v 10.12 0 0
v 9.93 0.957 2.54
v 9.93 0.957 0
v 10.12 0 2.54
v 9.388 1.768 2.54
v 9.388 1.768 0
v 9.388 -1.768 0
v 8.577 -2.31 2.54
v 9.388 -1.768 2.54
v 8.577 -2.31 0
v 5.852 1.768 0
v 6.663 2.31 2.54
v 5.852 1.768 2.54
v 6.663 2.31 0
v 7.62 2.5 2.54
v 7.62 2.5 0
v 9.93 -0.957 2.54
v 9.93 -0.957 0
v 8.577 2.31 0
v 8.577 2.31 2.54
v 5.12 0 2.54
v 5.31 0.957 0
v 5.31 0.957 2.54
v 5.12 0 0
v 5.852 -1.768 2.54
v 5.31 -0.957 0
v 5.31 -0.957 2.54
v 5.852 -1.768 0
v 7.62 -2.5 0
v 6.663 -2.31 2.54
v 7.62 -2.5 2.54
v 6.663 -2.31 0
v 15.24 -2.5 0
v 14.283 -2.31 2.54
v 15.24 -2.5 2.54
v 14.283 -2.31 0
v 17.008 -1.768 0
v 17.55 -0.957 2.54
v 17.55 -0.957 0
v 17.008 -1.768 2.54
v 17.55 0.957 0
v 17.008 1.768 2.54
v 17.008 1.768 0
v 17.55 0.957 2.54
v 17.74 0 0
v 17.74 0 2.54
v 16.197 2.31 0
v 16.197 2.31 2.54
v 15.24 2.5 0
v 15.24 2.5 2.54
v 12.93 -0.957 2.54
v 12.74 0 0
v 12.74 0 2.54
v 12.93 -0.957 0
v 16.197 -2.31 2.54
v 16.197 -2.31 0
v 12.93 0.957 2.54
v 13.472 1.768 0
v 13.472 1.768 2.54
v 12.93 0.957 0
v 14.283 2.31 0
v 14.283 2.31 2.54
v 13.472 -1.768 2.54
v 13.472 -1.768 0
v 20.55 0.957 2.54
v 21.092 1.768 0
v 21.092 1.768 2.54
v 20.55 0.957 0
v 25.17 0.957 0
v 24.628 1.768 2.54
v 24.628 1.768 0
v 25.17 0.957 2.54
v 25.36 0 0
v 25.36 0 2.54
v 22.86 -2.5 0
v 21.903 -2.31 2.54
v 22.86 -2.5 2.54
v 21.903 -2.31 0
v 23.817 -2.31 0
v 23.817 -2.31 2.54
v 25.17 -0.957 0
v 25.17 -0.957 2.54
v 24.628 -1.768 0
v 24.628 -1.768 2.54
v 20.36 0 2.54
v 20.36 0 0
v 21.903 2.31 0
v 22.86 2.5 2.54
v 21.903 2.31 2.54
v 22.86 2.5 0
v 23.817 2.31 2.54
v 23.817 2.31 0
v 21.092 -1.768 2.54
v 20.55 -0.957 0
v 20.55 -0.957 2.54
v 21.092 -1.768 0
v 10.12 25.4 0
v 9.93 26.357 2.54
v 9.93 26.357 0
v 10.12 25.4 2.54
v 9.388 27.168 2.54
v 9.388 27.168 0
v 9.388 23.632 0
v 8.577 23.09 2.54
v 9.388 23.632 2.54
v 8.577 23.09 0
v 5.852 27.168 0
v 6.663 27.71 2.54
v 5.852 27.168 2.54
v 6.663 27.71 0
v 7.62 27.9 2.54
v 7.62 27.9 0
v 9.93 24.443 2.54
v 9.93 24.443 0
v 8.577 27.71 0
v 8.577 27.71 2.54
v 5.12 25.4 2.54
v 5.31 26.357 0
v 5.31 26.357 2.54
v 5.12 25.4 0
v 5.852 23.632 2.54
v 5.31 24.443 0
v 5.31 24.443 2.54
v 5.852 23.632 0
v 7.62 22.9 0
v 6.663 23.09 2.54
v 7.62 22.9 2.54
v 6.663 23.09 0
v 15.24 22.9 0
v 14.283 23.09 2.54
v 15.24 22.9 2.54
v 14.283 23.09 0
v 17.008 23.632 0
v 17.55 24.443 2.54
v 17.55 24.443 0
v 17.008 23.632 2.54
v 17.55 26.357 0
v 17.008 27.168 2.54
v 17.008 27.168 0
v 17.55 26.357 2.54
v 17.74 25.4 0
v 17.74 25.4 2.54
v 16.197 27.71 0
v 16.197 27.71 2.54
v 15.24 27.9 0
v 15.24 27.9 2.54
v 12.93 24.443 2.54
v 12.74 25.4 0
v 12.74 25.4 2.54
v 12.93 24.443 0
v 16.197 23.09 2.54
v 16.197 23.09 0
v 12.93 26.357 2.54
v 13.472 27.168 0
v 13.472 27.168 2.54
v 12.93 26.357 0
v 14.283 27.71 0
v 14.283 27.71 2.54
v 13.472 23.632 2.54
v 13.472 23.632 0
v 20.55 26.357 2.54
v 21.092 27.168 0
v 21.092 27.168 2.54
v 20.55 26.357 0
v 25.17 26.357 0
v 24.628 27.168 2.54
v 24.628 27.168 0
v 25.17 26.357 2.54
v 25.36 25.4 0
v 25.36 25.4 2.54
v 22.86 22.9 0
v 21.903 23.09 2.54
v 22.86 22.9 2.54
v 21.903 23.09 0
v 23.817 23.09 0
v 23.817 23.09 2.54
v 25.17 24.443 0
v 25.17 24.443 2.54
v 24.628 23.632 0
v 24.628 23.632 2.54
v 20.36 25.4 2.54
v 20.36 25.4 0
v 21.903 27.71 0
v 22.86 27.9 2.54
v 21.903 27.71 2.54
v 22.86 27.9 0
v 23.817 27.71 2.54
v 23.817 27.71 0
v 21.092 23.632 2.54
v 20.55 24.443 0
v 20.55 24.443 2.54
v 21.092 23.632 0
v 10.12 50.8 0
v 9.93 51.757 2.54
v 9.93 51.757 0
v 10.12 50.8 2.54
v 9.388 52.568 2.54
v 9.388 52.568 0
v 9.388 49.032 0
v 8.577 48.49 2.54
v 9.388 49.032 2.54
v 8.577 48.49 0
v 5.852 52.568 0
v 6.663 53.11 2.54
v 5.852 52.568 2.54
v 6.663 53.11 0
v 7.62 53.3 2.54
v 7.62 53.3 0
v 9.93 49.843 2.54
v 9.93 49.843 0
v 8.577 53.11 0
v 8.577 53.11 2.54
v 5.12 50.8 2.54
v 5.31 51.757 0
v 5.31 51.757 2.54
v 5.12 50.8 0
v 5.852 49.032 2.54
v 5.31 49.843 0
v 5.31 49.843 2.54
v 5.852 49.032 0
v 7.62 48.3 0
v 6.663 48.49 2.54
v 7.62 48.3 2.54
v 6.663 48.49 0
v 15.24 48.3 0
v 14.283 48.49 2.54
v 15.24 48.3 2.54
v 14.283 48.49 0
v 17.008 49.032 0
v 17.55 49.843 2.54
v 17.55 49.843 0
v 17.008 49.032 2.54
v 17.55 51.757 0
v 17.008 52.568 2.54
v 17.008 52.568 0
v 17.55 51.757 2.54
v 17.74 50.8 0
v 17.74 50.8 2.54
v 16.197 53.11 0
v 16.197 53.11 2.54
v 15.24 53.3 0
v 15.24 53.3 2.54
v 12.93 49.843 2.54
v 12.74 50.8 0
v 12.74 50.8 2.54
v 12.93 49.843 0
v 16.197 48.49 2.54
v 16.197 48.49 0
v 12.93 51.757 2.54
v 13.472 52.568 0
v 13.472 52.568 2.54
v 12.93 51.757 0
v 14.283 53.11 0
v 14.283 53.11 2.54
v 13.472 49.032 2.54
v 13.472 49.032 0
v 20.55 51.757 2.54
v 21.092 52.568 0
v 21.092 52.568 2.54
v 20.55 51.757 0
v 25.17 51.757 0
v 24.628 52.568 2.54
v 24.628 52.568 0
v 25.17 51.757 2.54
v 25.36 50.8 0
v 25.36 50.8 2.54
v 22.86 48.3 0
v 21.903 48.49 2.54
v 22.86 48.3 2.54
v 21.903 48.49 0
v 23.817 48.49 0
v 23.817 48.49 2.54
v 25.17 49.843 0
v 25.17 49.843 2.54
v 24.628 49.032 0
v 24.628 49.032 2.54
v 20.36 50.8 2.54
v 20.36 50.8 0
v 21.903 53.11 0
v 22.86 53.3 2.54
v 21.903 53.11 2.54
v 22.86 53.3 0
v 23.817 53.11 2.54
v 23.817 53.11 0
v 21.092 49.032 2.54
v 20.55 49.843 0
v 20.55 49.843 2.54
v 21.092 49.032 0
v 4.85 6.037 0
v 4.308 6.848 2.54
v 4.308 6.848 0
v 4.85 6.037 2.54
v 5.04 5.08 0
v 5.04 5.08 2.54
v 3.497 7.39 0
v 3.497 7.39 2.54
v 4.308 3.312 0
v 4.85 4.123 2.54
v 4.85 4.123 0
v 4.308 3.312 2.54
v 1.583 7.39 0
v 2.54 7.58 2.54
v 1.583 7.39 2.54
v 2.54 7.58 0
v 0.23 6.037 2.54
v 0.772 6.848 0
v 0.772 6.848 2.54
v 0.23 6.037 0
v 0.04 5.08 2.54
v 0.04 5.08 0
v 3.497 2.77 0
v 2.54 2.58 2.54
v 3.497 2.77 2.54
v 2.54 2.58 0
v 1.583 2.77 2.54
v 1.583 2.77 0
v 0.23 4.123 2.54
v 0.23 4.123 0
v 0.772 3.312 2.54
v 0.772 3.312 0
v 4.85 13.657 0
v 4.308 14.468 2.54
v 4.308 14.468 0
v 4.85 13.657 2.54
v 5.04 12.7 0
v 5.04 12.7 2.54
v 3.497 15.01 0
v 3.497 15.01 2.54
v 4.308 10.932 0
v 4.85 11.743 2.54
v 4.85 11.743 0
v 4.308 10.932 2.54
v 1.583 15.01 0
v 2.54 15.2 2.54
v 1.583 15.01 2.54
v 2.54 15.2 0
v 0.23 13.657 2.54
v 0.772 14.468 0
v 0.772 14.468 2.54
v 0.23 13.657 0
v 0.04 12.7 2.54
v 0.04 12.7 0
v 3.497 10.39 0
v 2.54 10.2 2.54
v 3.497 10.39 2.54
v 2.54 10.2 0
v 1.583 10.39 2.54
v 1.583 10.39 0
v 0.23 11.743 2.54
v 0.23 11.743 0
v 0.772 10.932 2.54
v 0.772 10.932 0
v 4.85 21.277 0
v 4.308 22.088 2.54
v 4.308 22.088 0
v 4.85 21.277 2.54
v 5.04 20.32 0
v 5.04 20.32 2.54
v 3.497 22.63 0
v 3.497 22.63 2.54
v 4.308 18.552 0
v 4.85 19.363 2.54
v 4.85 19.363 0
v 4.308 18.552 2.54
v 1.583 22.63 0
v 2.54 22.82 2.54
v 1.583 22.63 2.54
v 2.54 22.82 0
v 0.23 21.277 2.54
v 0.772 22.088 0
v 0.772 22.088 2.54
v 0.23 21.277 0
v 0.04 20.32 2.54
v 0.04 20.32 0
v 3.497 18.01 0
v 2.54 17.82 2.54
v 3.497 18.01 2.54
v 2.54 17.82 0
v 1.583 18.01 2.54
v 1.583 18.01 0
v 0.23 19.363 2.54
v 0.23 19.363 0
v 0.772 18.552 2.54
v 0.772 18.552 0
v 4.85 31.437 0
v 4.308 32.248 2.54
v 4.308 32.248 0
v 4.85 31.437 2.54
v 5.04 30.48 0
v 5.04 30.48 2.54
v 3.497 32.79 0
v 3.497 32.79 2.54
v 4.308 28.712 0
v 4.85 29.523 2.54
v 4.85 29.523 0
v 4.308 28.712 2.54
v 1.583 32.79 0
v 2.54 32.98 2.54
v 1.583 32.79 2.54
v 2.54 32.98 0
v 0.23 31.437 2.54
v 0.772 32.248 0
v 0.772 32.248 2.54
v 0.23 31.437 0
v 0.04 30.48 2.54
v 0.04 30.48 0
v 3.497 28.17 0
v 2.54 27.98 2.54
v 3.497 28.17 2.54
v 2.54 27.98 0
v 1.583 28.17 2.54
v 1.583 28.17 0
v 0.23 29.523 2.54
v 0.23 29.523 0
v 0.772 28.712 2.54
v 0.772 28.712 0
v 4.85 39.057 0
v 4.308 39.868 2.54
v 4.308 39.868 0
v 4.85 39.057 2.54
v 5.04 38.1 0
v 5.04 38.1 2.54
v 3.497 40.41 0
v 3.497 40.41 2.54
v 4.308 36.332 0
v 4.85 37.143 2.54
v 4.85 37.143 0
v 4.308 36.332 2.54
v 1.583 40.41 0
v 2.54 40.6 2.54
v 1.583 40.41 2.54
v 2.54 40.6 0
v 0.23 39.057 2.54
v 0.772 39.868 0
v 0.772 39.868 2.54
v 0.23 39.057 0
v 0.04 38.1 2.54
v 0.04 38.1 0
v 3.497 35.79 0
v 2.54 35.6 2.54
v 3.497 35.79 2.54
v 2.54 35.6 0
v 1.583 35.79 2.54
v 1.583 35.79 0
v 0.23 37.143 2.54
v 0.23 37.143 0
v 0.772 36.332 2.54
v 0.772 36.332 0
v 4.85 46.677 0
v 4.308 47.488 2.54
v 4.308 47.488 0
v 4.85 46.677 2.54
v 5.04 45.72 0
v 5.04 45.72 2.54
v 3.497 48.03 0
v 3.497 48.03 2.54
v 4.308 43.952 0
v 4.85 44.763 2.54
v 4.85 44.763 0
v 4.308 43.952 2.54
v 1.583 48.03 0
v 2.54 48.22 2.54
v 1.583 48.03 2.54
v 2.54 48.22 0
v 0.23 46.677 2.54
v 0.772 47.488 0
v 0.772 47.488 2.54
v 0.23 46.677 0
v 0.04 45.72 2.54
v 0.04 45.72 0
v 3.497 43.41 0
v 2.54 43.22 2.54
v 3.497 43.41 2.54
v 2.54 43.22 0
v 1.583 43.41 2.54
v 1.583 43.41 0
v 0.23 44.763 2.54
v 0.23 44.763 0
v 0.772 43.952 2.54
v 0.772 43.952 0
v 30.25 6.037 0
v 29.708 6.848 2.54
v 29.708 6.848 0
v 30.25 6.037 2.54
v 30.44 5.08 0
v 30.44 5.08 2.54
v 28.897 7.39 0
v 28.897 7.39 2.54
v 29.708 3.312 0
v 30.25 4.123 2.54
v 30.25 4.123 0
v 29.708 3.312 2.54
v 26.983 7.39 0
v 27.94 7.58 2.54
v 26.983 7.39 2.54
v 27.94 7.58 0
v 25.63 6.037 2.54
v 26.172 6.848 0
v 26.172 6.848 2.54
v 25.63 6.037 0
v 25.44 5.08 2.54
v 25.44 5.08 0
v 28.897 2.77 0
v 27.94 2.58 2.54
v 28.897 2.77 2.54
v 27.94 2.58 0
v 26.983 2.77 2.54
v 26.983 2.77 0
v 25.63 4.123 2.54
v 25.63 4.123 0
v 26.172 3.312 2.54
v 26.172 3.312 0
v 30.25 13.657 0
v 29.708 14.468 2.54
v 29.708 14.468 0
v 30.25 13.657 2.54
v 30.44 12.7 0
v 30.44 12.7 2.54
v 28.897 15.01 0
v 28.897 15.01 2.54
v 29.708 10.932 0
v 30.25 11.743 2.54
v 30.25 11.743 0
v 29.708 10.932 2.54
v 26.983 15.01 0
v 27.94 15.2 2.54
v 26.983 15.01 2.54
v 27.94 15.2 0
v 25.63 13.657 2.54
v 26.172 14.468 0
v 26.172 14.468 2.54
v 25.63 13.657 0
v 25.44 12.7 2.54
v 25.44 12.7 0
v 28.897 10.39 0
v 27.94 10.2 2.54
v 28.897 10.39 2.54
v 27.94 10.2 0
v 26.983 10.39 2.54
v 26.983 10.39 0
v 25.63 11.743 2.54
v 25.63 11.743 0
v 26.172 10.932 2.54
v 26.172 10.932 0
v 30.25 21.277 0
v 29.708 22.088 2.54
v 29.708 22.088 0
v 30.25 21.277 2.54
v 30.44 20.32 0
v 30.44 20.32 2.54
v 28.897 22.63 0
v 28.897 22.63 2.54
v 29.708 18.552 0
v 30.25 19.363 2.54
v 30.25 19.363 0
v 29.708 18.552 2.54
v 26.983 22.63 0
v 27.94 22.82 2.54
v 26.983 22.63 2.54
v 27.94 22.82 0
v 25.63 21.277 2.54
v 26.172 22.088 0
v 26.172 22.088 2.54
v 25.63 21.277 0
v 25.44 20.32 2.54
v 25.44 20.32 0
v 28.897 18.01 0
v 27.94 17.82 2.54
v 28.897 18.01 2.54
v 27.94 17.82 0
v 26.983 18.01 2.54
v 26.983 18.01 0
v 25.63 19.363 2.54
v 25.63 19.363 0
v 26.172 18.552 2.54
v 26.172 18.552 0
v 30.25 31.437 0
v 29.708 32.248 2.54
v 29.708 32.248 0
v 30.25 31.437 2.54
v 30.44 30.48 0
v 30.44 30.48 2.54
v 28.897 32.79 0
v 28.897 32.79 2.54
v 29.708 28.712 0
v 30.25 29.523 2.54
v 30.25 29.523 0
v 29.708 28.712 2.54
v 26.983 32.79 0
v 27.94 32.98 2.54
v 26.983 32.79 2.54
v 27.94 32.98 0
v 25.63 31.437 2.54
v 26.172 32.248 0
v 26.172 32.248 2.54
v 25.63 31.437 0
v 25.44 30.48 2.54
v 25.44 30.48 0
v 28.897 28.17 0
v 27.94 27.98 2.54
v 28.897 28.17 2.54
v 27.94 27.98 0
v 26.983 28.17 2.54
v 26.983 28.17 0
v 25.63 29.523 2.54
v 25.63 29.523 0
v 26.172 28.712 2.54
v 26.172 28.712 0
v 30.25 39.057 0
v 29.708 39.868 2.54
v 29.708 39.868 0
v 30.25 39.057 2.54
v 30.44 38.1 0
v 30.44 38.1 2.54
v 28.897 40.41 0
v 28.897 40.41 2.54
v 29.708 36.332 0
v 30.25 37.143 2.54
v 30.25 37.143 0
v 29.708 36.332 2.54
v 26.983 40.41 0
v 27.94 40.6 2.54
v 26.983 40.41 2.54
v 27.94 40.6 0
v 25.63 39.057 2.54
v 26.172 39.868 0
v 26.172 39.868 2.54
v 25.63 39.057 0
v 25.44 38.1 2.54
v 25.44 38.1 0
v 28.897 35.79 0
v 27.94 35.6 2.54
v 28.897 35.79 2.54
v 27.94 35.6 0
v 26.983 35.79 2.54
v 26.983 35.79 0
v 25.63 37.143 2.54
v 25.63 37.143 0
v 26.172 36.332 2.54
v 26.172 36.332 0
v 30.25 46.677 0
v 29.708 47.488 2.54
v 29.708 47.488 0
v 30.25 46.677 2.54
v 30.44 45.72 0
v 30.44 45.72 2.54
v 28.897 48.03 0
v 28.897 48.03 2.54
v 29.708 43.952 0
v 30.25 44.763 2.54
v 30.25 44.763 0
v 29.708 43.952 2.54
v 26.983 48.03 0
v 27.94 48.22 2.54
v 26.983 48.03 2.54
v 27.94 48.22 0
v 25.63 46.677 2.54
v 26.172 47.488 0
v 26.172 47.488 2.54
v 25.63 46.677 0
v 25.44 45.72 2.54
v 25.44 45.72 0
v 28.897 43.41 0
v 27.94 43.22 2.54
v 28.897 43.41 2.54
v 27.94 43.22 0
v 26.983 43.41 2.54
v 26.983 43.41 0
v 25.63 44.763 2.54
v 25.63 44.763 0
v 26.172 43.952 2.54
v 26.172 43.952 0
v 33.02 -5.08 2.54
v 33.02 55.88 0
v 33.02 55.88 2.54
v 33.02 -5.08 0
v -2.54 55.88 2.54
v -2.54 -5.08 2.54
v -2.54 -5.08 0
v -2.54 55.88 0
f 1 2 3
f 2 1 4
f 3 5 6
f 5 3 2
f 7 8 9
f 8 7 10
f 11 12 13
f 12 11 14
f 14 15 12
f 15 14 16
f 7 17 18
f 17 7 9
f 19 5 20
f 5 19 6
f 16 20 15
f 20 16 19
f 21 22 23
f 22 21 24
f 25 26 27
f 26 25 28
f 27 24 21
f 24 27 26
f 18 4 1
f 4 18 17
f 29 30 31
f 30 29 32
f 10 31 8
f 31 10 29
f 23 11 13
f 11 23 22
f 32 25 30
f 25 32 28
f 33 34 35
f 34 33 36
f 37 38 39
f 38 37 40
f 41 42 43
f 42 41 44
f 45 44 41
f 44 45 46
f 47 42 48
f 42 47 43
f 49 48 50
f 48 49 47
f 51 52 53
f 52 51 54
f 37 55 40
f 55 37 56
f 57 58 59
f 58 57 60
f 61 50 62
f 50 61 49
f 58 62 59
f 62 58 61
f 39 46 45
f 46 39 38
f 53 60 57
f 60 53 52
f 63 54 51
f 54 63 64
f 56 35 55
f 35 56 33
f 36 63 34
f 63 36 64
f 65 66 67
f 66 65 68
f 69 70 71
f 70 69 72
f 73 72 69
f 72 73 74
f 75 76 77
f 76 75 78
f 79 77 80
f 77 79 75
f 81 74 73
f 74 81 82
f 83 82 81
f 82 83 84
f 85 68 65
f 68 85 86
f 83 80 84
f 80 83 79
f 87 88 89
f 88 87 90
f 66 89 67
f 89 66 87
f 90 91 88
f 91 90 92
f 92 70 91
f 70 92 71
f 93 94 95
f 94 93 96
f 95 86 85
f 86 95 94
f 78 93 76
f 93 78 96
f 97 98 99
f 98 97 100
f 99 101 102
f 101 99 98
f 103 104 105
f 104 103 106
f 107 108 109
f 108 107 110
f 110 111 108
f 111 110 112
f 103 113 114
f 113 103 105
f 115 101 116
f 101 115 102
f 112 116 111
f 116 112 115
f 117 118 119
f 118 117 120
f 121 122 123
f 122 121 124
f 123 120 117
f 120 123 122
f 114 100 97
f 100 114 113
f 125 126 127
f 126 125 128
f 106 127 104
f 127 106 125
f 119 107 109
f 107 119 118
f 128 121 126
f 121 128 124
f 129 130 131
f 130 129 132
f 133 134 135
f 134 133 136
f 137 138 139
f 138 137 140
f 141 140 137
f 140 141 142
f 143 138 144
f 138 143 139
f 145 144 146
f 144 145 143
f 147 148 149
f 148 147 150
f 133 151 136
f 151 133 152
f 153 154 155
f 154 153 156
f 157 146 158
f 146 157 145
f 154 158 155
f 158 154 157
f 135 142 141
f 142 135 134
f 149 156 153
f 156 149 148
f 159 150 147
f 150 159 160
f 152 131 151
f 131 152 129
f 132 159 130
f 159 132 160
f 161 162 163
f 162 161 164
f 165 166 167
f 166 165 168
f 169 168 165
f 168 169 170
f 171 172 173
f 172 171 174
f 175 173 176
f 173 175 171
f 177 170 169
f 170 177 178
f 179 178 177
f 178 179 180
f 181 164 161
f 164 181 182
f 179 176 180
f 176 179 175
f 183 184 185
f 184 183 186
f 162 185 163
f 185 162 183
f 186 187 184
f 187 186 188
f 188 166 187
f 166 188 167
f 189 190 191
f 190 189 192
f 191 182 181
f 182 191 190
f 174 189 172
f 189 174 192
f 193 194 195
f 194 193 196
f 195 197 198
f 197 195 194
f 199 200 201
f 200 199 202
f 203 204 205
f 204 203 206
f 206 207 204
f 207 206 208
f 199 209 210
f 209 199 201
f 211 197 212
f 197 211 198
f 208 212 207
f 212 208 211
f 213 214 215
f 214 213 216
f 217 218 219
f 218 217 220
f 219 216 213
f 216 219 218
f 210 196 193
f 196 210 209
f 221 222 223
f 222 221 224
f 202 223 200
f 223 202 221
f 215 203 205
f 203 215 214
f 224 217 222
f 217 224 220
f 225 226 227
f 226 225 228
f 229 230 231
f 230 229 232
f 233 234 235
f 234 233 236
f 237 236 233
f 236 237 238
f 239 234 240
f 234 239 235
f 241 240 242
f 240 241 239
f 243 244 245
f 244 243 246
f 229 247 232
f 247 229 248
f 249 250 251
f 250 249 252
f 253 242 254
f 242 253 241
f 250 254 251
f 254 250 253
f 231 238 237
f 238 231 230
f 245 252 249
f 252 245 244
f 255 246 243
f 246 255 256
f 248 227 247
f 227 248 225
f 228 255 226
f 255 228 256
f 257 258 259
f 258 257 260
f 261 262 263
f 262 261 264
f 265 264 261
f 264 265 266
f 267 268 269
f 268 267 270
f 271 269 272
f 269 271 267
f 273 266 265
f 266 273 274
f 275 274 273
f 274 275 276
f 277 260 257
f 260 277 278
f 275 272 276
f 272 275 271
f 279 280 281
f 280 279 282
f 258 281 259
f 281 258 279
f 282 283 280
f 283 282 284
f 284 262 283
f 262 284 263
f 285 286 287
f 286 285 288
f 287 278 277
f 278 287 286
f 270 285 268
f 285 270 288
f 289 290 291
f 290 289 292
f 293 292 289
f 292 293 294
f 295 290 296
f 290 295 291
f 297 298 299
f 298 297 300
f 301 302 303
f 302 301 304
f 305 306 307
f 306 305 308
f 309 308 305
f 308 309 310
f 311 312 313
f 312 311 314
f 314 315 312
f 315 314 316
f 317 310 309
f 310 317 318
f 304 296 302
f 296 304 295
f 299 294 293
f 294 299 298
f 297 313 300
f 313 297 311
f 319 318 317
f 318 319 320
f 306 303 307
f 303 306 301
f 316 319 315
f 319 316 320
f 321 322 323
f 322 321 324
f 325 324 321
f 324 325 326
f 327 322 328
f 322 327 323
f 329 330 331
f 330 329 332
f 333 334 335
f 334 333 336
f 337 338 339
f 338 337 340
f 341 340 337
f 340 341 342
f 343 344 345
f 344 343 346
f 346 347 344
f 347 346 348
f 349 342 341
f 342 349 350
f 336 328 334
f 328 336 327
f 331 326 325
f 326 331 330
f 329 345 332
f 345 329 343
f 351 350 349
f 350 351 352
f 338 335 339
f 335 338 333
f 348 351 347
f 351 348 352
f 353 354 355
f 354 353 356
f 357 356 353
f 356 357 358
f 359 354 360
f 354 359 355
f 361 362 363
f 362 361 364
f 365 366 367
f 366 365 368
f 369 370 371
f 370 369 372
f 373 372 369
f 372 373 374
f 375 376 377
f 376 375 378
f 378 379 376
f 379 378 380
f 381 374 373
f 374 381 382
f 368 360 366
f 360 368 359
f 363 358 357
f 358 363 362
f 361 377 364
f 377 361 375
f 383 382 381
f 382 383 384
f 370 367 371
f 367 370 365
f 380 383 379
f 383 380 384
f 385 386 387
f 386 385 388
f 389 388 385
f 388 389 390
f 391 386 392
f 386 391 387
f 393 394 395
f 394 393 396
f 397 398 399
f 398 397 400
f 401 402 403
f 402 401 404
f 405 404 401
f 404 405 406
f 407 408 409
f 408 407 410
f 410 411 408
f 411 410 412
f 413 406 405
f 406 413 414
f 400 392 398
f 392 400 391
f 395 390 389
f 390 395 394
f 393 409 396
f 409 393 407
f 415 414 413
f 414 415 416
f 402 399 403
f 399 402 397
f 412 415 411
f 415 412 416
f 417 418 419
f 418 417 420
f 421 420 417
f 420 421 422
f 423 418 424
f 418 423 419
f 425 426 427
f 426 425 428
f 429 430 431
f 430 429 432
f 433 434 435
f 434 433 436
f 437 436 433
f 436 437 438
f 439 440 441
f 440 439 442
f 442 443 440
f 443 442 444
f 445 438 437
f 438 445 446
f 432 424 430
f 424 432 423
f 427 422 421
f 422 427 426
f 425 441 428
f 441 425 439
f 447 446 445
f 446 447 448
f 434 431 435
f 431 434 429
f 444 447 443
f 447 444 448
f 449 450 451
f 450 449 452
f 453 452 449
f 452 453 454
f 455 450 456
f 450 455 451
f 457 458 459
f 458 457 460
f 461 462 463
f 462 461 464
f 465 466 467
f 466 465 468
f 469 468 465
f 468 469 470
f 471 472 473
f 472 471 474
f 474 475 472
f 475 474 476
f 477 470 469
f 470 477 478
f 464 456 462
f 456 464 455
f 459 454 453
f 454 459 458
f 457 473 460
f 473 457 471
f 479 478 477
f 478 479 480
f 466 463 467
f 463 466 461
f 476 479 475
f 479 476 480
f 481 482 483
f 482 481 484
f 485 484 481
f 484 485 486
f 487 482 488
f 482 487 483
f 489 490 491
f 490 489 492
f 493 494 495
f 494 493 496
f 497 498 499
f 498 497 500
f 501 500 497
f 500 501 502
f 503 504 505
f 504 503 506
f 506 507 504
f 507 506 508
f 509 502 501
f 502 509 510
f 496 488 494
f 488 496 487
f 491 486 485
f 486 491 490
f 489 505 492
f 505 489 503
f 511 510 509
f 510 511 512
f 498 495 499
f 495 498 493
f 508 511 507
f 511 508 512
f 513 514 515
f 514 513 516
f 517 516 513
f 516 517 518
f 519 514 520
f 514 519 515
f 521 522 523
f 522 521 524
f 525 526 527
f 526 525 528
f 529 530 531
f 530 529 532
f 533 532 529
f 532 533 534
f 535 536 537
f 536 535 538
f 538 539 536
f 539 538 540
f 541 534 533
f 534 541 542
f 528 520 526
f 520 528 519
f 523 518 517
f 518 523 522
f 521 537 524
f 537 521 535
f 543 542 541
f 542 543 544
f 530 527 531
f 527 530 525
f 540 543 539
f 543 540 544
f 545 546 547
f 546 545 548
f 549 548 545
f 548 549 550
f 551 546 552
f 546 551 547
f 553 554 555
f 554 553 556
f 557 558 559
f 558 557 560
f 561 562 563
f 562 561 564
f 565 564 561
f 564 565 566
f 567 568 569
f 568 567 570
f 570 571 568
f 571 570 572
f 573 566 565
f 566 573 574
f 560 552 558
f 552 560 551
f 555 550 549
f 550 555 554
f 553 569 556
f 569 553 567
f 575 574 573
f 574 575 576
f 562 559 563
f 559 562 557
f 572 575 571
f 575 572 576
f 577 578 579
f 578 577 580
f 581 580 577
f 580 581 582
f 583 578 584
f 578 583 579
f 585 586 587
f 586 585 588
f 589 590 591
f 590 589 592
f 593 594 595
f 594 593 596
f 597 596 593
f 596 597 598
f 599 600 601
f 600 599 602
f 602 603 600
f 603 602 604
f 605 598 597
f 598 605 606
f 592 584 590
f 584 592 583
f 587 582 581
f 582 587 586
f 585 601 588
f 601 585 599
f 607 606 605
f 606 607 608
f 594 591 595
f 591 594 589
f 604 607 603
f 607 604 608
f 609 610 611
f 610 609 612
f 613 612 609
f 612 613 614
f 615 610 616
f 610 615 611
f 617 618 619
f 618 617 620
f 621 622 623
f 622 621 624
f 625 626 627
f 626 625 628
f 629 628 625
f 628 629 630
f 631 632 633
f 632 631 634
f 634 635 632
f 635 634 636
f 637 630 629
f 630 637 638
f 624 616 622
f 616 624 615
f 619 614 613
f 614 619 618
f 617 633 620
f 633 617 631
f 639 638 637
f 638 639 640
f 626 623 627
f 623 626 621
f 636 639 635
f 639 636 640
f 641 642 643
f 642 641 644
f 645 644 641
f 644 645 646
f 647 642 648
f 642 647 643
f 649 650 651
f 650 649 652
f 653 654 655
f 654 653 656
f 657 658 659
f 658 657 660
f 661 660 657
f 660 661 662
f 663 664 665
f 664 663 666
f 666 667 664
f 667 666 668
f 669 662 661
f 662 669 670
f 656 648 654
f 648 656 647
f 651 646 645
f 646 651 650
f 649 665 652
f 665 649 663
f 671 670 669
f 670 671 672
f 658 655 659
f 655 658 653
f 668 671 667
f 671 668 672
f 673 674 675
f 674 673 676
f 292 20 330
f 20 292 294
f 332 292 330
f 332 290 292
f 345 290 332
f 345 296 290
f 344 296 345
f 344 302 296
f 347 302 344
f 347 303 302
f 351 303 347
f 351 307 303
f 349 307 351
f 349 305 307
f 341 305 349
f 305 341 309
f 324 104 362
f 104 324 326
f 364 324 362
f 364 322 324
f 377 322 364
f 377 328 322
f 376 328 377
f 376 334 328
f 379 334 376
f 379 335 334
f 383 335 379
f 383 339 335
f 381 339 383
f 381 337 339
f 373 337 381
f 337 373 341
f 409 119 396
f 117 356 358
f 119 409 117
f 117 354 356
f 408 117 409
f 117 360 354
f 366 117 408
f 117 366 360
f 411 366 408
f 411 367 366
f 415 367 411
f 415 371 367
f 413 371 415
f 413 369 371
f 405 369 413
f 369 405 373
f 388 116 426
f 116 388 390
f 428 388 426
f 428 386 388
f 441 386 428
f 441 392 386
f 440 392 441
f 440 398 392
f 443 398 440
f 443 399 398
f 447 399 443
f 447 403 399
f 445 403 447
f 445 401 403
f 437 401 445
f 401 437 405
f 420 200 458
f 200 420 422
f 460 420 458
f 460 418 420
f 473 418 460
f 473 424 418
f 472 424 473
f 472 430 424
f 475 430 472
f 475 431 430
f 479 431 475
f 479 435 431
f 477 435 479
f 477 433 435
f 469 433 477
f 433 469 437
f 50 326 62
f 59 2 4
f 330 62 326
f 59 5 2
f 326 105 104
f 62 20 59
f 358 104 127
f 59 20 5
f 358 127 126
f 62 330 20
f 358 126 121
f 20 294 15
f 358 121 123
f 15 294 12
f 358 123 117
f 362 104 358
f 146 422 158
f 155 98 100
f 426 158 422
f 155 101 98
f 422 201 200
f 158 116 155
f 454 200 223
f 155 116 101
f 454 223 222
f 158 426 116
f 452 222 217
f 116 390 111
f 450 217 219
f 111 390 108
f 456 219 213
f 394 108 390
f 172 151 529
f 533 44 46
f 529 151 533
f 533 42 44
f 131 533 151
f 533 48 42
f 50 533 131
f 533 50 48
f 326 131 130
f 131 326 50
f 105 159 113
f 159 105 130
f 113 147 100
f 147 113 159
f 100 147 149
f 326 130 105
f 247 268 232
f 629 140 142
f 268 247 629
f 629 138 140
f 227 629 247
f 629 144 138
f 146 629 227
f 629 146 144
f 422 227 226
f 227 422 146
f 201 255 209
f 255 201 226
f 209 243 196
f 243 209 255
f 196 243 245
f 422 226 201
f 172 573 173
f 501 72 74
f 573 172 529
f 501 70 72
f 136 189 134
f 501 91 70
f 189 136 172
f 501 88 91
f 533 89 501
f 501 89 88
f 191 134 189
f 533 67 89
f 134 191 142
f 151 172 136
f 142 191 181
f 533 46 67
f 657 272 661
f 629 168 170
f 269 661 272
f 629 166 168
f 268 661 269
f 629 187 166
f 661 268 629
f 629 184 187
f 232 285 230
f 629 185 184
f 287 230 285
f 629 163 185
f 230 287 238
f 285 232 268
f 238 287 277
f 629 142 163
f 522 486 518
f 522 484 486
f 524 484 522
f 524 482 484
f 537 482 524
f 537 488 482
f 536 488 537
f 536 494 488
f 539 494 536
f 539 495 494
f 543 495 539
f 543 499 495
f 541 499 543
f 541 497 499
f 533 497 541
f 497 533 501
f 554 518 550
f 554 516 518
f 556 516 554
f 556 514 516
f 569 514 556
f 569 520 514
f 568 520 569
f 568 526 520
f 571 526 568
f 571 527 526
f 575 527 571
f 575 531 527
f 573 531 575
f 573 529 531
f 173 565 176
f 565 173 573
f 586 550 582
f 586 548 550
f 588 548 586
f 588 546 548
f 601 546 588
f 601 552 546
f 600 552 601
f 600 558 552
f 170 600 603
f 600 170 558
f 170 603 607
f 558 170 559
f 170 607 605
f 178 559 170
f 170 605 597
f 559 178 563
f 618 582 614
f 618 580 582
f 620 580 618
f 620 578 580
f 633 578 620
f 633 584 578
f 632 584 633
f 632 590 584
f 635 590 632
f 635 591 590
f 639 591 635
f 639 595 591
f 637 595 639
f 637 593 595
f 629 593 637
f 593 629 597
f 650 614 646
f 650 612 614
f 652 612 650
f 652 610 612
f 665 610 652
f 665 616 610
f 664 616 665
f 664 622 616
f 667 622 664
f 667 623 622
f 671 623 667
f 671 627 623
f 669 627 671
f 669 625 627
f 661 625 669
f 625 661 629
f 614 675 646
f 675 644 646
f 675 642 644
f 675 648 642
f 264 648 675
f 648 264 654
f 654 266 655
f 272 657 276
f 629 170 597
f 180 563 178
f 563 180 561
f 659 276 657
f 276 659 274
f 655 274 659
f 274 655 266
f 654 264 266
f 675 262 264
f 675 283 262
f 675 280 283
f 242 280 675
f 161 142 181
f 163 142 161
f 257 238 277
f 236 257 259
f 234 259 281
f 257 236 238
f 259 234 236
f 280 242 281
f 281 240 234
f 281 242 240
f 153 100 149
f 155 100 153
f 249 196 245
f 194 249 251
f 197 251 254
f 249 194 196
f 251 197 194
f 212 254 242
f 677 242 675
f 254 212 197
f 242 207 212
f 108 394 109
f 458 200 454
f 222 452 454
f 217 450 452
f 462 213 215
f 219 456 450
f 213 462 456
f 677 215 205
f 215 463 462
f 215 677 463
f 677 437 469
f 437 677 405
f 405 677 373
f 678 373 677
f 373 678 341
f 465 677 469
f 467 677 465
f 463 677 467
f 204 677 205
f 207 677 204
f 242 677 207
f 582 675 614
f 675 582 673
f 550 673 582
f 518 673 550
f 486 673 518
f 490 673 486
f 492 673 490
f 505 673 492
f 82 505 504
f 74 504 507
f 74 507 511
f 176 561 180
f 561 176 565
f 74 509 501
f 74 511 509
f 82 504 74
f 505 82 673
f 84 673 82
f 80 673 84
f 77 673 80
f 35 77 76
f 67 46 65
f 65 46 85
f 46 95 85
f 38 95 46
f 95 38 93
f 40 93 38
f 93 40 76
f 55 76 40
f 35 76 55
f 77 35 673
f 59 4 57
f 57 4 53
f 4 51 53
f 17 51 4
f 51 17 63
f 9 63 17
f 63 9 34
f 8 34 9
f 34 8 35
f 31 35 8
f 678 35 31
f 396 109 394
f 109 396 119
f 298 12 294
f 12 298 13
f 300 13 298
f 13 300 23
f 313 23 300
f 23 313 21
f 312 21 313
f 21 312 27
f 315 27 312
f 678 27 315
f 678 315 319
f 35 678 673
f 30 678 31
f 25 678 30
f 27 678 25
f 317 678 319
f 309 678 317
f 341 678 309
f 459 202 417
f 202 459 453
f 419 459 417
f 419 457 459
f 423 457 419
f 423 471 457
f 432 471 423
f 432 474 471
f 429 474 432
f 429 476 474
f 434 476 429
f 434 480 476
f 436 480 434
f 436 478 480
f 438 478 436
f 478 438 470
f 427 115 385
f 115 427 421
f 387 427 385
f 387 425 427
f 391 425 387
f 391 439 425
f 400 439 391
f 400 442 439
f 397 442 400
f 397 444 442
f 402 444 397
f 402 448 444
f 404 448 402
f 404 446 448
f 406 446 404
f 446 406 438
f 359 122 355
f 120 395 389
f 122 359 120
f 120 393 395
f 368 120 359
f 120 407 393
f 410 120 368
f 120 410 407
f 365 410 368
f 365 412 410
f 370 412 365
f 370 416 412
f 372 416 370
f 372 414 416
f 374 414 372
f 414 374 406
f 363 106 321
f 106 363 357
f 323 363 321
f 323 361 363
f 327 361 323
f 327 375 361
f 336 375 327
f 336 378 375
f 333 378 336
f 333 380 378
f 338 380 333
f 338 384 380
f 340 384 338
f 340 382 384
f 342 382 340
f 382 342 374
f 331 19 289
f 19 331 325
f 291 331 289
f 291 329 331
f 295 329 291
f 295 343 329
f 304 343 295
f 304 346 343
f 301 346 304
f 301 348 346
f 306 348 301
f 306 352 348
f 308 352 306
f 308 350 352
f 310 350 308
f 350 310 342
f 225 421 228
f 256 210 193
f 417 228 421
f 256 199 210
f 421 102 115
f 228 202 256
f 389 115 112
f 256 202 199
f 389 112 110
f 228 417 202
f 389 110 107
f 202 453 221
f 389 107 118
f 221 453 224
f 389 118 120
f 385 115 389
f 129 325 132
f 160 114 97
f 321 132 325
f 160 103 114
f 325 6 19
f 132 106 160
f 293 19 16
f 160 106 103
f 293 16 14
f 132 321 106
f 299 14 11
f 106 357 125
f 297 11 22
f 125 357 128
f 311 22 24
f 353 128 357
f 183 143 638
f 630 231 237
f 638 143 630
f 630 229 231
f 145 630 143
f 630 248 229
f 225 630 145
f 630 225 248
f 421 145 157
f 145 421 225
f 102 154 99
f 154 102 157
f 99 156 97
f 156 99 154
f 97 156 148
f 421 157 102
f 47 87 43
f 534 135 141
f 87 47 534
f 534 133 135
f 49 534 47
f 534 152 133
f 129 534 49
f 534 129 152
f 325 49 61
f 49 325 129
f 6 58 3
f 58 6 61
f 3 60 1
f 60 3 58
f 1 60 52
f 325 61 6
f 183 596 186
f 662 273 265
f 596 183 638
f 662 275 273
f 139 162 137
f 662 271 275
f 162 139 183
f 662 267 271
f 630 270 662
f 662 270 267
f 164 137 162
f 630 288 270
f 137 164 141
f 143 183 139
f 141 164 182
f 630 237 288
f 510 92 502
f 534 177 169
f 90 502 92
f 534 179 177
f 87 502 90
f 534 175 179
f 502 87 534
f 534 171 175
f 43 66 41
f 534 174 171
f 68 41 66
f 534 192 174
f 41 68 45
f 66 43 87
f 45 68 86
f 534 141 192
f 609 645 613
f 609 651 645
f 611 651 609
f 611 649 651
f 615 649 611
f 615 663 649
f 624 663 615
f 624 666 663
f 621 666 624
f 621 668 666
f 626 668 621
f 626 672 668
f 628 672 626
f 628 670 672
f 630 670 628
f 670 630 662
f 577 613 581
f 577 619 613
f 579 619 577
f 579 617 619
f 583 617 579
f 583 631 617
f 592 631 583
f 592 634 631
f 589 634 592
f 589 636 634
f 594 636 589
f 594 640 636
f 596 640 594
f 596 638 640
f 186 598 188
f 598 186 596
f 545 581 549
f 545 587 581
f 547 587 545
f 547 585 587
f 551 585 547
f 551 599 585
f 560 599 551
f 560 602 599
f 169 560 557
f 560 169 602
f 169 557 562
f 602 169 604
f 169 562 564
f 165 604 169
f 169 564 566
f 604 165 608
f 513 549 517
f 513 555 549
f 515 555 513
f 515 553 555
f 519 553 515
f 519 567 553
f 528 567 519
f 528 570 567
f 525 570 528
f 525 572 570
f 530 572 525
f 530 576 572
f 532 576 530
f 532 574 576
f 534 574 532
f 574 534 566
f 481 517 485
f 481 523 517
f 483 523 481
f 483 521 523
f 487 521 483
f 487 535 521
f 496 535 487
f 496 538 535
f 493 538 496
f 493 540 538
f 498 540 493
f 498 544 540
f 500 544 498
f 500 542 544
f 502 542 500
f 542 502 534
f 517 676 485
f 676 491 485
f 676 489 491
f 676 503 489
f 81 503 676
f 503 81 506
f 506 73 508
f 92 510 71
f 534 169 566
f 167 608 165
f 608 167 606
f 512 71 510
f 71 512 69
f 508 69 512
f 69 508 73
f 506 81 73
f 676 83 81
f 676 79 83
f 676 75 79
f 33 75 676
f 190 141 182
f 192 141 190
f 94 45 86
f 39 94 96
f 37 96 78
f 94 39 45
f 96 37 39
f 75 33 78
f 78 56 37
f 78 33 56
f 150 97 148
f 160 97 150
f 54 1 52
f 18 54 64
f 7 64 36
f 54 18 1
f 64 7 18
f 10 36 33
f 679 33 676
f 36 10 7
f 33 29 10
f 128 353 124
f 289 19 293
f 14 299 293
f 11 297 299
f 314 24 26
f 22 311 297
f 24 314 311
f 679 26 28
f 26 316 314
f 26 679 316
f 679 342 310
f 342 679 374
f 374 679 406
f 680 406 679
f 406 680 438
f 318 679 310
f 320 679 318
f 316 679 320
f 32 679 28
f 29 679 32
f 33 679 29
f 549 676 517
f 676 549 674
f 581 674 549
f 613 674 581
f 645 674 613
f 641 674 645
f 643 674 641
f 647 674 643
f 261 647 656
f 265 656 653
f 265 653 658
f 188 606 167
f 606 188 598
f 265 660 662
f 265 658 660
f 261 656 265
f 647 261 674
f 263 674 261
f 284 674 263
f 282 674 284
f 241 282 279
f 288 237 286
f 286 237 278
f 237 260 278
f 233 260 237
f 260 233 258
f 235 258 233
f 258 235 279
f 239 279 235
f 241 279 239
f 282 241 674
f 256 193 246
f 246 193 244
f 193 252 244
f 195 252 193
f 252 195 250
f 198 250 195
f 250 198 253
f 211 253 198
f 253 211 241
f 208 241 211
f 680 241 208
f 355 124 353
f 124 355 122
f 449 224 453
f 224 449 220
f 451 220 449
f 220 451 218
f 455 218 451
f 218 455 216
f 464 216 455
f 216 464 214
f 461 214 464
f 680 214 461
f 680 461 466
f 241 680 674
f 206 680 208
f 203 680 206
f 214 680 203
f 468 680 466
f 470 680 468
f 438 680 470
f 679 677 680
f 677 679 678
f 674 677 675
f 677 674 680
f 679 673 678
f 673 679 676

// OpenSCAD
// [FL_INDEX: keywords="openscad, 3d_parametric, Parametric_seven_segment_push-through_plate, csg_solid" | COT="Parametric OpenSCAD design from 3DCodeverse"]
// Title: Parametric seven segment push-through plate

// ===== file: sevensegment_2d.scad =====
grid=1.27;
unit_height=3;
hole_size=3.1;

number_of_units=1;

//  - segment
module horizontal_segment()
 {
union()
{
translate([2*grid,0])
circle(h=unit_height+2,r=hole_size/2,$fn=16);
translate([5*grid,0])
circle(h=unit_height+2,r=hole_size/2,$fn=16);
translate([8*grid,0])
circle(h=unit_height+2,r=hole_size/2,$fn=16);
}
}

// | Segment
module vertical_segment()
{
union()
{
translate([0,2*grid])
circle(h=unit_height+2,r=hole_size/2,$fn=16);
translate([0,5*grid])
circle(h=unit_height+2,r=hole_size/2,$fn=16);
translate([0,8*grid])
circle(h=unit_height+2,r=hole_size/2,$fn=16);
}
}

module display_unit()
{
difference()
{
translate([-2*grid,-2*grid,0])
square ([14*grid,24*grid]);

translate([0,0,0])
horizontal_segment();
translate([0,10*grid,0])
horizontal_segment();
translate([0,20*grid,0])
horizontal_segment();

translate([0,0,0])
vertical_segment();
translate([0,10*grid,0])
vertical_segment();
translate([10*grid,0,0])
vertical_segment();
translate([10*grid,10*grid,0])
vertical_segment();
}
}

for (i=[1:14:number_of_units*14])
{
translate([i*grid,0,0])
display_unit();
}



// ===== file: sevensegment_push_through.scad =====
grid=2.54;
unit_height=2.54;
hole_size=5;

number_of_units=1;

//  - segment
module horizontal_segment()
 {
union()
{
translate([2*grid,0,-1])
cylinder(h=unit_height+2,r=hole_size/2,$fn=16);
translate([5*grid,0,-1])
cylinder(h=unit_height+2,r=hole_size/2,$fn=16);
translate([8*grid,0,-1])
cylinder(h=unit_height+2,r=hole_size/2,$fn=16);
}
}

// | Segment
module vertical_segment()
{
union()
{
translate([0,2*grid,-1])
cylinder(h=unit_height+2,r=hole_size/2,$fn=16);
translate([0,5*grid,-1])
cylinder(h=unit_height+2,r=hole_size/2,$fn=16);
translate([0,8*grid,-1])
cylinder(h=unit_height+2,r=hole_size/2,$fn=16);
}
}

module display_unit()
{
difference()
{
translate([-2*grid,-2*grid,0])
cube ([14*grid,24*grid,unit_height]);

translate([0,0,0])
horizontal_segment();
translate([0,10*grid,0])
horizontal_segment();
translate([0,20*grid,0])
horizontal_segment();

translate([0,0,0])
vertical_segment();
translate([0,10*grid,0])
vertical_segment();
translate([10*grid,0,0])
vertical_segment();
translate([10*grid,10*grid,0])
vertical_segment();
}
}

for (i=[1:14:number_of_units*14])
{
translate([i*grid,0,0])
display_unit();
}
